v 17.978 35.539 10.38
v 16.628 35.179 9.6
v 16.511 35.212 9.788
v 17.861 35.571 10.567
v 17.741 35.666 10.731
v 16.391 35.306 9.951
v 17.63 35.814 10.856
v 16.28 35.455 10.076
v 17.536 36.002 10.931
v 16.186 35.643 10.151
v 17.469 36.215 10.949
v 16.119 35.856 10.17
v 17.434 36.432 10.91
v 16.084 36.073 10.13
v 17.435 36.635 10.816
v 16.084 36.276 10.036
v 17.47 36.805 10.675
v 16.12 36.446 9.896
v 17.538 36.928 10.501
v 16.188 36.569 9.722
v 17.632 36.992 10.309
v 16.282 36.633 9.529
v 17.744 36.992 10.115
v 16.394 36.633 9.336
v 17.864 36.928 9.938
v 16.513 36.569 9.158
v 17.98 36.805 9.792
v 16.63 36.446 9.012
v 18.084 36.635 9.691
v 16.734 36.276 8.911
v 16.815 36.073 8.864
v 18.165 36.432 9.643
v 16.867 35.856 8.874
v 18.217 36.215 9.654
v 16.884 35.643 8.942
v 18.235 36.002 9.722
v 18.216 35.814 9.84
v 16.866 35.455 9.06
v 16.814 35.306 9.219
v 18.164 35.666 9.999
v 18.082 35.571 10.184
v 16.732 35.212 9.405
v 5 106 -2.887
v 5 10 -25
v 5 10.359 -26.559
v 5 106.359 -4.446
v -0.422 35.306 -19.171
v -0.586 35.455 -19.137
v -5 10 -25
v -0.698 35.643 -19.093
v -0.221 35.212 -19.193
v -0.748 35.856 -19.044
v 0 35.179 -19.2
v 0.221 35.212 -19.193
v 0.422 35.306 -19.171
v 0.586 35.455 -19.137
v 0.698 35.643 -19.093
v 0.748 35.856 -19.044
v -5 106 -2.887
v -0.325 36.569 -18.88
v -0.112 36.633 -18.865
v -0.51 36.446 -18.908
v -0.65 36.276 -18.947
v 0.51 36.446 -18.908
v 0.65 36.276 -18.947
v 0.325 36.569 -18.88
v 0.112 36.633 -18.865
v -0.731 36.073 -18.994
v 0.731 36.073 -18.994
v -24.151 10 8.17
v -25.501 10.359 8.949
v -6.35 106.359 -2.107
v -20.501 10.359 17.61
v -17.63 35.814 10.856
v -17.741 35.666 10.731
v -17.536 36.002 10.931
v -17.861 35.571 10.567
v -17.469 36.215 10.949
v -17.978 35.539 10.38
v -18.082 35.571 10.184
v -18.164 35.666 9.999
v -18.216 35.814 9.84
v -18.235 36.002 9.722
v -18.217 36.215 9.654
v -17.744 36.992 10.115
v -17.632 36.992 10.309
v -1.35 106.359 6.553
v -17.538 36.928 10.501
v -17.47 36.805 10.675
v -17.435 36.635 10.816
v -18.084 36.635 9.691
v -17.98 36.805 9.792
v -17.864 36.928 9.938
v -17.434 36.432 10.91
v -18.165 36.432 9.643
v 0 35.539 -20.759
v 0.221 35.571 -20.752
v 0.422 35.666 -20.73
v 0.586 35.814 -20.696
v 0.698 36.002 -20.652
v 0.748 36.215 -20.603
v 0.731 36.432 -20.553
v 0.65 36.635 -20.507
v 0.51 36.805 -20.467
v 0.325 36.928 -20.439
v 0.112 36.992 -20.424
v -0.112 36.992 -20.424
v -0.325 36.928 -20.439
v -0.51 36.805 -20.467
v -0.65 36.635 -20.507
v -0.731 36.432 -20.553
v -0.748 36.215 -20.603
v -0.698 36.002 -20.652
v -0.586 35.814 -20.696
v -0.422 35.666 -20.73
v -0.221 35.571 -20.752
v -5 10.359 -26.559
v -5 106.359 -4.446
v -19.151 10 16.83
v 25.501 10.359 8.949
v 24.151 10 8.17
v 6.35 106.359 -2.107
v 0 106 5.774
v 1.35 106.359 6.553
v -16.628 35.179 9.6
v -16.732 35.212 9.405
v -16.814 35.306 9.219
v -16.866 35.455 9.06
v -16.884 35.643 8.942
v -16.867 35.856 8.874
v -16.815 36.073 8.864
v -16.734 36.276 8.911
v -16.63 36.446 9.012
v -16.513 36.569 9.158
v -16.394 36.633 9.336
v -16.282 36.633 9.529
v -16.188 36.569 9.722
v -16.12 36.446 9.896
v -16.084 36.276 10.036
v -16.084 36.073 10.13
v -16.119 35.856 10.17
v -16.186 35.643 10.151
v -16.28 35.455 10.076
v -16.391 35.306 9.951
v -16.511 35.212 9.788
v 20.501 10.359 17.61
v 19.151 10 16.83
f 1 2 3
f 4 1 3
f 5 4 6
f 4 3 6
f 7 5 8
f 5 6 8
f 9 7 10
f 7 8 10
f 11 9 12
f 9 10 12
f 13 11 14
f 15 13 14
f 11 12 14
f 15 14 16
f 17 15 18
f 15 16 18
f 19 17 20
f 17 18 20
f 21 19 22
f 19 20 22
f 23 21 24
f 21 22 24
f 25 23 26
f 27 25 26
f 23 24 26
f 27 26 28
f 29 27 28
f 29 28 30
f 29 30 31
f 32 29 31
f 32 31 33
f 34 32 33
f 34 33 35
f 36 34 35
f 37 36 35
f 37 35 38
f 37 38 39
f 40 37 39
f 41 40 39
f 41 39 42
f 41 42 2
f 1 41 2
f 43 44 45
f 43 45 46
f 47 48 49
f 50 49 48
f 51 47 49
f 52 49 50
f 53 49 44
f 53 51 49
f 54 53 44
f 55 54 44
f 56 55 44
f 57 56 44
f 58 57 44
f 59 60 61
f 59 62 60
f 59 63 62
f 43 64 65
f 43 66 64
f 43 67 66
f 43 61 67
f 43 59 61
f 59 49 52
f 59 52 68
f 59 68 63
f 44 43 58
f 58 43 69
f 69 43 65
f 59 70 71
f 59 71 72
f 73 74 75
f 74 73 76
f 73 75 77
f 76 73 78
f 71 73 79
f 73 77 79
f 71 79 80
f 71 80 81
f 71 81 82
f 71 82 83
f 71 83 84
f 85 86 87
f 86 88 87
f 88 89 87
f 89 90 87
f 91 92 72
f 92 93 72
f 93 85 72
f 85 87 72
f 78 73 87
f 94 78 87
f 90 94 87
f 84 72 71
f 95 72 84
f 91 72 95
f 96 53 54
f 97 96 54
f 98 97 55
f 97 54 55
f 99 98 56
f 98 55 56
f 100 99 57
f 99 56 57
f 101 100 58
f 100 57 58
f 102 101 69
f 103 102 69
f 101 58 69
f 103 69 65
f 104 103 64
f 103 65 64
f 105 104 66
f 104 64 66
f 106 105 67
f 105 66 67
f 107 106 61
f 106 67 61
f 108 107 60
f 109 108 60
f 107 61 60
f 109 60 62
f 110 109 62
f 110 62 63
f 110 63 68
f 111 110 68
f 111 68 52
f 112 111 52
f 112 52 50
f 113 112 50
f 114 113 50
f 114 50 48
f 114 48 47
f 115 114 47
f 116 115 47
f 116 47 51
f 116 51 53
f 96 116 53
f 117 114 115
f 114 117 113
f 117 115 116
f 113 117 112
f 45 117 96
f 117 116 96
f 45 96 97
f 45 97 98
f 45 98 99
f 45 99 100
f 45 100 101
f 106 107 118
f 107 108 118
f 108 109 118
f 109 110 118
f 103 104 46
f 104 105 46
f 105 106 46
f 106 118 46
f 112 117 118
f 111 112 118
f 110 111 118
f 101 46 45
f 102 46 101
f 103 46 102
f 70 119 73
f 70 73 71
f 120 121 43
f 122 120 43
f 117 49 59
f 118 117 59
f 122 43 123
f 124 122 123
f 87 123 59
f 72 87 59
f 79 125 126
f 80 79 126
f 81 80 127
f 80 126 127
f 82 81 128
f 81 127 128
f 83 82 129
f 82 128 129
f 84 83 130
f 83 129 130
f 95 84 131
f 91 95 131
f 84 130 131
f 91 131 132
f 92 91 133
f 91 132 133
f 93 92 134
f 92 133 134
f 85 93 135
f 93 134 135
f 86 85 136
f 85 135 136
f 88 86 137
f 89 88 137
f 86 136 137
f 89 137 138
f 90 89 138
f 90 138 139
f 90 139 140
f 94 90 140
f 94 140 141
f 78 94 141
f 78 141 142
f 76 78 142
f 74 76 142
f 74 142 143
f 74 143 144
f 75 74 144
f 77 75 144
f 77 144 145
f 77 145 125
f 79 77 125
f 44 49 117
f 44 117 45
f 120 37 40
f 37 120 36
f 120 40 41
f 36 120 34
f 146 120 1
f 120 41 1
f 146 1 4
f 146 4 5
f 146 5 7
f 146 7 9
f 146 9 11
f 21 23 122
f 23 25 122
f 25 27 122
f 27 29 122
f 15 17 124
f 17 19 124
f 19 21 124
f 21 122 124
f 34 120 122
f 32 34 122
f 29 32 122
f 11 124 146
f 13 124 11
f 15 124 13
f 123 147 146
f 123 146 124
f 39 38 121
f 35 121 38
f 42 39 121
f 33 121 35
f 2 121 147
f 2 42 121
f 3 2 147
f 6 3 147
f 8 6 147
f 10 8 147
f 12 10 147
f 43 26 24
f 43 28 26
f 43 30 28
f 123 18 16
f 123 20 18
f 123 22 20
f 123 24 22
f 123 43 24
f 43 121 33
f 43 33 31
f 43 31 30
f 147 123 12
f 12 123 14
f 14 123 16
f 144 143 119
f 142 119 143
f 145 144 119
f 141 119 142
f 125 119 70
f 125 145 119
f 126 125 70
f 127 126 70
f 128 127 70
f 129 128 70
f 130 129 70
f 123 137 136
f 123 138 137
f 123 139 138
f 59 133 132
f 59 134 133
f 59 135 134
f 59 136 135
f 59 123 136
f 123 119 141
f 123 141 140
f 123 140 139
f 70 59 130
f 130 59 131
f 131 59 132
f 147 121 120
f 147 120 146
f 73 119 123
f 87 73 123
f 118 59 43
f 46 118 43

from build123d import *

# Parameters (mm, degrees)
SKETCH_4_W               = 10
SKETCH_4_H               = 98.513936913
EXTRUDE_1_DEPTH          = 1.6
SKETCH_5_R               = 0.75
CUT_EXTRUDE_1_DEPTH      = 104.118352348
PATTERN_CIRCULAR_3_COUNT = 3


with BuildPart() as part:
    # 草图4 → 凸台-拉伸1 (new body)
    with BuildSketch(Plane(origin=(0, 5.97236267, -25.927751518), x_dir=(1, 0, 0), z_dir=(0, -0.22446822598970886, 0.9744814085045609))):
        with Locations((0, 53.390076892)):
            Rectangle(SKETCH_4_W, SKETCH_4_H)
    extrude(amount=-EXTRUDE_1_DEPTH)

    # 草图5 → 切除-拉伸1 (cut, through all)
    with BuildSketch(Plane(origin=(0, 5.97236267, -25.927751518), x_dir=(1, 0, 0), z_dir=(0, -0.22446822598970892, 0.9744814085045609))):
        with Locations((0, 30.721954777)):
            Circle(SKETCH_5_R)
    extrude(amount=-CUT_EXTRUDE_1_DEPTH, mode=Mode.SUBTRACT)


with BuildPart() as pattern_circular_3_1:
    # 阵列(圆周)3: pattern copy
    add(part.part.rotate(Axis((0, 108.058043324, 0), (0, -1, 0)), 1 * 360 / PATTERN_CIRCULAR_3_COUNT))


with BuildPart() as pattern_circular_3_2:
    # 阵列(圆周)3: pattern copy
    add(part.part.rotate(Axis((0, 108.058043324, 0), (0, -1, 0)), 2 * 360 / PATTERN_CIRCULAR_3_COUNT))


solid = Compound([part.part, pattern_circular_3_1.part, pattern_circular_3_2.part])
